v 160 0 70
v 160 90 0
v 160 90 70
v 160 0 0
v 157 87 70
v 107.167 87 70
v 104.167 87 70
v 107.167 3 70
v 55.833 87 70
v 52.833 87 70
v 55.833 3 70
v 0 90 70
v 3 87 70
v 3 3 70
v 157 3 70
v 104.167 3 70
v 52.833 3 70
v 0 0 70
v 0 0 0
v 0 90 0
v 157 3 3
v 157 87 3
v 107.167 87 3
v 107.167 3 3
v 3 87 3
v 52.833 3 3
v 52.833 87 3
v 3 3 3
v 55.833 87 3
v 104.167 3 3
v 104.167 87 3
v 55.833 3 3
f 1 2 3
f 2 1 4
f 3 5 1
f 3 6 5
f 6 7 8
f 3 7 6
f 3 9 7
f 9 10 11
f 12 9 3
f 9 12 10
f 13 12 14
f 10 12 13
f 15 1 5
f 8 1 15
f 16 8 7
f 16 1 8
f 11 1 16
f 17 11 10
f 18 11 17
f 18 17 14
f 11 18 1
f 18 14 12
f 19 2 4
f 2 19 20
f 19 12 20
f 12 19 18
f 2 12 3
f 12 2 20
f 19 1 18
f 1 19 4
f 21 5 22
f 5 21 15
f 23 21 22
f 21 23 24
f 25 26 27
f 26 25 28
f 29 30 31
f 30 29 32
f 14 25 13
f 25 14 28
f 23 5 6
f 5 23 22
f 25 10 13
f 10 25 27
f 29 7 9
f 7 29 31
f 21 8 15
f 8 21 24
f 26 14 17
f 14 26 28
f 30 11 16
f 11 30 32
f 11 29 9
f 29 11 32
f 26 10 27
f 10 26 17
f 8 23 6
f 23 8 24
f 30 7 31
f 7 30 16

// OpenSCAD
// Lesson 10 starter: simple parametric desktop organizer
// Units: millimetres

width = 160;
depth = 90;
height = 70;
wall = 3;
base = 3;
divider_count = 2;

assert(width > 2 * wall, "Width must exceed two wall thicknesses");
assert(depth > 2 * wall, "Depth must exceed two wall thicknesses");
assert(height > base, "Height must exceed base thickness");
assert(divider_count >= 0, "Divider count cannot be negative");

module shell() {
    difference() {
        cube([width, depth, height]);
        translate([wall, wall, base])
            cube([width - 2 * wall, depth - 2 * wall, height]);
    }
}

module dividers() {
    usable_width = width - 2 * wall;
    for (i = [1 : divider_count]) {
        x = wall + usable_width * i / (divider_count + 1) - wall / 2;
        translate([x, wall, base])
            cube([wall, depth - 2 * wall, height - base]);
    }
}

union() {
    shell();
    dividers();
}
